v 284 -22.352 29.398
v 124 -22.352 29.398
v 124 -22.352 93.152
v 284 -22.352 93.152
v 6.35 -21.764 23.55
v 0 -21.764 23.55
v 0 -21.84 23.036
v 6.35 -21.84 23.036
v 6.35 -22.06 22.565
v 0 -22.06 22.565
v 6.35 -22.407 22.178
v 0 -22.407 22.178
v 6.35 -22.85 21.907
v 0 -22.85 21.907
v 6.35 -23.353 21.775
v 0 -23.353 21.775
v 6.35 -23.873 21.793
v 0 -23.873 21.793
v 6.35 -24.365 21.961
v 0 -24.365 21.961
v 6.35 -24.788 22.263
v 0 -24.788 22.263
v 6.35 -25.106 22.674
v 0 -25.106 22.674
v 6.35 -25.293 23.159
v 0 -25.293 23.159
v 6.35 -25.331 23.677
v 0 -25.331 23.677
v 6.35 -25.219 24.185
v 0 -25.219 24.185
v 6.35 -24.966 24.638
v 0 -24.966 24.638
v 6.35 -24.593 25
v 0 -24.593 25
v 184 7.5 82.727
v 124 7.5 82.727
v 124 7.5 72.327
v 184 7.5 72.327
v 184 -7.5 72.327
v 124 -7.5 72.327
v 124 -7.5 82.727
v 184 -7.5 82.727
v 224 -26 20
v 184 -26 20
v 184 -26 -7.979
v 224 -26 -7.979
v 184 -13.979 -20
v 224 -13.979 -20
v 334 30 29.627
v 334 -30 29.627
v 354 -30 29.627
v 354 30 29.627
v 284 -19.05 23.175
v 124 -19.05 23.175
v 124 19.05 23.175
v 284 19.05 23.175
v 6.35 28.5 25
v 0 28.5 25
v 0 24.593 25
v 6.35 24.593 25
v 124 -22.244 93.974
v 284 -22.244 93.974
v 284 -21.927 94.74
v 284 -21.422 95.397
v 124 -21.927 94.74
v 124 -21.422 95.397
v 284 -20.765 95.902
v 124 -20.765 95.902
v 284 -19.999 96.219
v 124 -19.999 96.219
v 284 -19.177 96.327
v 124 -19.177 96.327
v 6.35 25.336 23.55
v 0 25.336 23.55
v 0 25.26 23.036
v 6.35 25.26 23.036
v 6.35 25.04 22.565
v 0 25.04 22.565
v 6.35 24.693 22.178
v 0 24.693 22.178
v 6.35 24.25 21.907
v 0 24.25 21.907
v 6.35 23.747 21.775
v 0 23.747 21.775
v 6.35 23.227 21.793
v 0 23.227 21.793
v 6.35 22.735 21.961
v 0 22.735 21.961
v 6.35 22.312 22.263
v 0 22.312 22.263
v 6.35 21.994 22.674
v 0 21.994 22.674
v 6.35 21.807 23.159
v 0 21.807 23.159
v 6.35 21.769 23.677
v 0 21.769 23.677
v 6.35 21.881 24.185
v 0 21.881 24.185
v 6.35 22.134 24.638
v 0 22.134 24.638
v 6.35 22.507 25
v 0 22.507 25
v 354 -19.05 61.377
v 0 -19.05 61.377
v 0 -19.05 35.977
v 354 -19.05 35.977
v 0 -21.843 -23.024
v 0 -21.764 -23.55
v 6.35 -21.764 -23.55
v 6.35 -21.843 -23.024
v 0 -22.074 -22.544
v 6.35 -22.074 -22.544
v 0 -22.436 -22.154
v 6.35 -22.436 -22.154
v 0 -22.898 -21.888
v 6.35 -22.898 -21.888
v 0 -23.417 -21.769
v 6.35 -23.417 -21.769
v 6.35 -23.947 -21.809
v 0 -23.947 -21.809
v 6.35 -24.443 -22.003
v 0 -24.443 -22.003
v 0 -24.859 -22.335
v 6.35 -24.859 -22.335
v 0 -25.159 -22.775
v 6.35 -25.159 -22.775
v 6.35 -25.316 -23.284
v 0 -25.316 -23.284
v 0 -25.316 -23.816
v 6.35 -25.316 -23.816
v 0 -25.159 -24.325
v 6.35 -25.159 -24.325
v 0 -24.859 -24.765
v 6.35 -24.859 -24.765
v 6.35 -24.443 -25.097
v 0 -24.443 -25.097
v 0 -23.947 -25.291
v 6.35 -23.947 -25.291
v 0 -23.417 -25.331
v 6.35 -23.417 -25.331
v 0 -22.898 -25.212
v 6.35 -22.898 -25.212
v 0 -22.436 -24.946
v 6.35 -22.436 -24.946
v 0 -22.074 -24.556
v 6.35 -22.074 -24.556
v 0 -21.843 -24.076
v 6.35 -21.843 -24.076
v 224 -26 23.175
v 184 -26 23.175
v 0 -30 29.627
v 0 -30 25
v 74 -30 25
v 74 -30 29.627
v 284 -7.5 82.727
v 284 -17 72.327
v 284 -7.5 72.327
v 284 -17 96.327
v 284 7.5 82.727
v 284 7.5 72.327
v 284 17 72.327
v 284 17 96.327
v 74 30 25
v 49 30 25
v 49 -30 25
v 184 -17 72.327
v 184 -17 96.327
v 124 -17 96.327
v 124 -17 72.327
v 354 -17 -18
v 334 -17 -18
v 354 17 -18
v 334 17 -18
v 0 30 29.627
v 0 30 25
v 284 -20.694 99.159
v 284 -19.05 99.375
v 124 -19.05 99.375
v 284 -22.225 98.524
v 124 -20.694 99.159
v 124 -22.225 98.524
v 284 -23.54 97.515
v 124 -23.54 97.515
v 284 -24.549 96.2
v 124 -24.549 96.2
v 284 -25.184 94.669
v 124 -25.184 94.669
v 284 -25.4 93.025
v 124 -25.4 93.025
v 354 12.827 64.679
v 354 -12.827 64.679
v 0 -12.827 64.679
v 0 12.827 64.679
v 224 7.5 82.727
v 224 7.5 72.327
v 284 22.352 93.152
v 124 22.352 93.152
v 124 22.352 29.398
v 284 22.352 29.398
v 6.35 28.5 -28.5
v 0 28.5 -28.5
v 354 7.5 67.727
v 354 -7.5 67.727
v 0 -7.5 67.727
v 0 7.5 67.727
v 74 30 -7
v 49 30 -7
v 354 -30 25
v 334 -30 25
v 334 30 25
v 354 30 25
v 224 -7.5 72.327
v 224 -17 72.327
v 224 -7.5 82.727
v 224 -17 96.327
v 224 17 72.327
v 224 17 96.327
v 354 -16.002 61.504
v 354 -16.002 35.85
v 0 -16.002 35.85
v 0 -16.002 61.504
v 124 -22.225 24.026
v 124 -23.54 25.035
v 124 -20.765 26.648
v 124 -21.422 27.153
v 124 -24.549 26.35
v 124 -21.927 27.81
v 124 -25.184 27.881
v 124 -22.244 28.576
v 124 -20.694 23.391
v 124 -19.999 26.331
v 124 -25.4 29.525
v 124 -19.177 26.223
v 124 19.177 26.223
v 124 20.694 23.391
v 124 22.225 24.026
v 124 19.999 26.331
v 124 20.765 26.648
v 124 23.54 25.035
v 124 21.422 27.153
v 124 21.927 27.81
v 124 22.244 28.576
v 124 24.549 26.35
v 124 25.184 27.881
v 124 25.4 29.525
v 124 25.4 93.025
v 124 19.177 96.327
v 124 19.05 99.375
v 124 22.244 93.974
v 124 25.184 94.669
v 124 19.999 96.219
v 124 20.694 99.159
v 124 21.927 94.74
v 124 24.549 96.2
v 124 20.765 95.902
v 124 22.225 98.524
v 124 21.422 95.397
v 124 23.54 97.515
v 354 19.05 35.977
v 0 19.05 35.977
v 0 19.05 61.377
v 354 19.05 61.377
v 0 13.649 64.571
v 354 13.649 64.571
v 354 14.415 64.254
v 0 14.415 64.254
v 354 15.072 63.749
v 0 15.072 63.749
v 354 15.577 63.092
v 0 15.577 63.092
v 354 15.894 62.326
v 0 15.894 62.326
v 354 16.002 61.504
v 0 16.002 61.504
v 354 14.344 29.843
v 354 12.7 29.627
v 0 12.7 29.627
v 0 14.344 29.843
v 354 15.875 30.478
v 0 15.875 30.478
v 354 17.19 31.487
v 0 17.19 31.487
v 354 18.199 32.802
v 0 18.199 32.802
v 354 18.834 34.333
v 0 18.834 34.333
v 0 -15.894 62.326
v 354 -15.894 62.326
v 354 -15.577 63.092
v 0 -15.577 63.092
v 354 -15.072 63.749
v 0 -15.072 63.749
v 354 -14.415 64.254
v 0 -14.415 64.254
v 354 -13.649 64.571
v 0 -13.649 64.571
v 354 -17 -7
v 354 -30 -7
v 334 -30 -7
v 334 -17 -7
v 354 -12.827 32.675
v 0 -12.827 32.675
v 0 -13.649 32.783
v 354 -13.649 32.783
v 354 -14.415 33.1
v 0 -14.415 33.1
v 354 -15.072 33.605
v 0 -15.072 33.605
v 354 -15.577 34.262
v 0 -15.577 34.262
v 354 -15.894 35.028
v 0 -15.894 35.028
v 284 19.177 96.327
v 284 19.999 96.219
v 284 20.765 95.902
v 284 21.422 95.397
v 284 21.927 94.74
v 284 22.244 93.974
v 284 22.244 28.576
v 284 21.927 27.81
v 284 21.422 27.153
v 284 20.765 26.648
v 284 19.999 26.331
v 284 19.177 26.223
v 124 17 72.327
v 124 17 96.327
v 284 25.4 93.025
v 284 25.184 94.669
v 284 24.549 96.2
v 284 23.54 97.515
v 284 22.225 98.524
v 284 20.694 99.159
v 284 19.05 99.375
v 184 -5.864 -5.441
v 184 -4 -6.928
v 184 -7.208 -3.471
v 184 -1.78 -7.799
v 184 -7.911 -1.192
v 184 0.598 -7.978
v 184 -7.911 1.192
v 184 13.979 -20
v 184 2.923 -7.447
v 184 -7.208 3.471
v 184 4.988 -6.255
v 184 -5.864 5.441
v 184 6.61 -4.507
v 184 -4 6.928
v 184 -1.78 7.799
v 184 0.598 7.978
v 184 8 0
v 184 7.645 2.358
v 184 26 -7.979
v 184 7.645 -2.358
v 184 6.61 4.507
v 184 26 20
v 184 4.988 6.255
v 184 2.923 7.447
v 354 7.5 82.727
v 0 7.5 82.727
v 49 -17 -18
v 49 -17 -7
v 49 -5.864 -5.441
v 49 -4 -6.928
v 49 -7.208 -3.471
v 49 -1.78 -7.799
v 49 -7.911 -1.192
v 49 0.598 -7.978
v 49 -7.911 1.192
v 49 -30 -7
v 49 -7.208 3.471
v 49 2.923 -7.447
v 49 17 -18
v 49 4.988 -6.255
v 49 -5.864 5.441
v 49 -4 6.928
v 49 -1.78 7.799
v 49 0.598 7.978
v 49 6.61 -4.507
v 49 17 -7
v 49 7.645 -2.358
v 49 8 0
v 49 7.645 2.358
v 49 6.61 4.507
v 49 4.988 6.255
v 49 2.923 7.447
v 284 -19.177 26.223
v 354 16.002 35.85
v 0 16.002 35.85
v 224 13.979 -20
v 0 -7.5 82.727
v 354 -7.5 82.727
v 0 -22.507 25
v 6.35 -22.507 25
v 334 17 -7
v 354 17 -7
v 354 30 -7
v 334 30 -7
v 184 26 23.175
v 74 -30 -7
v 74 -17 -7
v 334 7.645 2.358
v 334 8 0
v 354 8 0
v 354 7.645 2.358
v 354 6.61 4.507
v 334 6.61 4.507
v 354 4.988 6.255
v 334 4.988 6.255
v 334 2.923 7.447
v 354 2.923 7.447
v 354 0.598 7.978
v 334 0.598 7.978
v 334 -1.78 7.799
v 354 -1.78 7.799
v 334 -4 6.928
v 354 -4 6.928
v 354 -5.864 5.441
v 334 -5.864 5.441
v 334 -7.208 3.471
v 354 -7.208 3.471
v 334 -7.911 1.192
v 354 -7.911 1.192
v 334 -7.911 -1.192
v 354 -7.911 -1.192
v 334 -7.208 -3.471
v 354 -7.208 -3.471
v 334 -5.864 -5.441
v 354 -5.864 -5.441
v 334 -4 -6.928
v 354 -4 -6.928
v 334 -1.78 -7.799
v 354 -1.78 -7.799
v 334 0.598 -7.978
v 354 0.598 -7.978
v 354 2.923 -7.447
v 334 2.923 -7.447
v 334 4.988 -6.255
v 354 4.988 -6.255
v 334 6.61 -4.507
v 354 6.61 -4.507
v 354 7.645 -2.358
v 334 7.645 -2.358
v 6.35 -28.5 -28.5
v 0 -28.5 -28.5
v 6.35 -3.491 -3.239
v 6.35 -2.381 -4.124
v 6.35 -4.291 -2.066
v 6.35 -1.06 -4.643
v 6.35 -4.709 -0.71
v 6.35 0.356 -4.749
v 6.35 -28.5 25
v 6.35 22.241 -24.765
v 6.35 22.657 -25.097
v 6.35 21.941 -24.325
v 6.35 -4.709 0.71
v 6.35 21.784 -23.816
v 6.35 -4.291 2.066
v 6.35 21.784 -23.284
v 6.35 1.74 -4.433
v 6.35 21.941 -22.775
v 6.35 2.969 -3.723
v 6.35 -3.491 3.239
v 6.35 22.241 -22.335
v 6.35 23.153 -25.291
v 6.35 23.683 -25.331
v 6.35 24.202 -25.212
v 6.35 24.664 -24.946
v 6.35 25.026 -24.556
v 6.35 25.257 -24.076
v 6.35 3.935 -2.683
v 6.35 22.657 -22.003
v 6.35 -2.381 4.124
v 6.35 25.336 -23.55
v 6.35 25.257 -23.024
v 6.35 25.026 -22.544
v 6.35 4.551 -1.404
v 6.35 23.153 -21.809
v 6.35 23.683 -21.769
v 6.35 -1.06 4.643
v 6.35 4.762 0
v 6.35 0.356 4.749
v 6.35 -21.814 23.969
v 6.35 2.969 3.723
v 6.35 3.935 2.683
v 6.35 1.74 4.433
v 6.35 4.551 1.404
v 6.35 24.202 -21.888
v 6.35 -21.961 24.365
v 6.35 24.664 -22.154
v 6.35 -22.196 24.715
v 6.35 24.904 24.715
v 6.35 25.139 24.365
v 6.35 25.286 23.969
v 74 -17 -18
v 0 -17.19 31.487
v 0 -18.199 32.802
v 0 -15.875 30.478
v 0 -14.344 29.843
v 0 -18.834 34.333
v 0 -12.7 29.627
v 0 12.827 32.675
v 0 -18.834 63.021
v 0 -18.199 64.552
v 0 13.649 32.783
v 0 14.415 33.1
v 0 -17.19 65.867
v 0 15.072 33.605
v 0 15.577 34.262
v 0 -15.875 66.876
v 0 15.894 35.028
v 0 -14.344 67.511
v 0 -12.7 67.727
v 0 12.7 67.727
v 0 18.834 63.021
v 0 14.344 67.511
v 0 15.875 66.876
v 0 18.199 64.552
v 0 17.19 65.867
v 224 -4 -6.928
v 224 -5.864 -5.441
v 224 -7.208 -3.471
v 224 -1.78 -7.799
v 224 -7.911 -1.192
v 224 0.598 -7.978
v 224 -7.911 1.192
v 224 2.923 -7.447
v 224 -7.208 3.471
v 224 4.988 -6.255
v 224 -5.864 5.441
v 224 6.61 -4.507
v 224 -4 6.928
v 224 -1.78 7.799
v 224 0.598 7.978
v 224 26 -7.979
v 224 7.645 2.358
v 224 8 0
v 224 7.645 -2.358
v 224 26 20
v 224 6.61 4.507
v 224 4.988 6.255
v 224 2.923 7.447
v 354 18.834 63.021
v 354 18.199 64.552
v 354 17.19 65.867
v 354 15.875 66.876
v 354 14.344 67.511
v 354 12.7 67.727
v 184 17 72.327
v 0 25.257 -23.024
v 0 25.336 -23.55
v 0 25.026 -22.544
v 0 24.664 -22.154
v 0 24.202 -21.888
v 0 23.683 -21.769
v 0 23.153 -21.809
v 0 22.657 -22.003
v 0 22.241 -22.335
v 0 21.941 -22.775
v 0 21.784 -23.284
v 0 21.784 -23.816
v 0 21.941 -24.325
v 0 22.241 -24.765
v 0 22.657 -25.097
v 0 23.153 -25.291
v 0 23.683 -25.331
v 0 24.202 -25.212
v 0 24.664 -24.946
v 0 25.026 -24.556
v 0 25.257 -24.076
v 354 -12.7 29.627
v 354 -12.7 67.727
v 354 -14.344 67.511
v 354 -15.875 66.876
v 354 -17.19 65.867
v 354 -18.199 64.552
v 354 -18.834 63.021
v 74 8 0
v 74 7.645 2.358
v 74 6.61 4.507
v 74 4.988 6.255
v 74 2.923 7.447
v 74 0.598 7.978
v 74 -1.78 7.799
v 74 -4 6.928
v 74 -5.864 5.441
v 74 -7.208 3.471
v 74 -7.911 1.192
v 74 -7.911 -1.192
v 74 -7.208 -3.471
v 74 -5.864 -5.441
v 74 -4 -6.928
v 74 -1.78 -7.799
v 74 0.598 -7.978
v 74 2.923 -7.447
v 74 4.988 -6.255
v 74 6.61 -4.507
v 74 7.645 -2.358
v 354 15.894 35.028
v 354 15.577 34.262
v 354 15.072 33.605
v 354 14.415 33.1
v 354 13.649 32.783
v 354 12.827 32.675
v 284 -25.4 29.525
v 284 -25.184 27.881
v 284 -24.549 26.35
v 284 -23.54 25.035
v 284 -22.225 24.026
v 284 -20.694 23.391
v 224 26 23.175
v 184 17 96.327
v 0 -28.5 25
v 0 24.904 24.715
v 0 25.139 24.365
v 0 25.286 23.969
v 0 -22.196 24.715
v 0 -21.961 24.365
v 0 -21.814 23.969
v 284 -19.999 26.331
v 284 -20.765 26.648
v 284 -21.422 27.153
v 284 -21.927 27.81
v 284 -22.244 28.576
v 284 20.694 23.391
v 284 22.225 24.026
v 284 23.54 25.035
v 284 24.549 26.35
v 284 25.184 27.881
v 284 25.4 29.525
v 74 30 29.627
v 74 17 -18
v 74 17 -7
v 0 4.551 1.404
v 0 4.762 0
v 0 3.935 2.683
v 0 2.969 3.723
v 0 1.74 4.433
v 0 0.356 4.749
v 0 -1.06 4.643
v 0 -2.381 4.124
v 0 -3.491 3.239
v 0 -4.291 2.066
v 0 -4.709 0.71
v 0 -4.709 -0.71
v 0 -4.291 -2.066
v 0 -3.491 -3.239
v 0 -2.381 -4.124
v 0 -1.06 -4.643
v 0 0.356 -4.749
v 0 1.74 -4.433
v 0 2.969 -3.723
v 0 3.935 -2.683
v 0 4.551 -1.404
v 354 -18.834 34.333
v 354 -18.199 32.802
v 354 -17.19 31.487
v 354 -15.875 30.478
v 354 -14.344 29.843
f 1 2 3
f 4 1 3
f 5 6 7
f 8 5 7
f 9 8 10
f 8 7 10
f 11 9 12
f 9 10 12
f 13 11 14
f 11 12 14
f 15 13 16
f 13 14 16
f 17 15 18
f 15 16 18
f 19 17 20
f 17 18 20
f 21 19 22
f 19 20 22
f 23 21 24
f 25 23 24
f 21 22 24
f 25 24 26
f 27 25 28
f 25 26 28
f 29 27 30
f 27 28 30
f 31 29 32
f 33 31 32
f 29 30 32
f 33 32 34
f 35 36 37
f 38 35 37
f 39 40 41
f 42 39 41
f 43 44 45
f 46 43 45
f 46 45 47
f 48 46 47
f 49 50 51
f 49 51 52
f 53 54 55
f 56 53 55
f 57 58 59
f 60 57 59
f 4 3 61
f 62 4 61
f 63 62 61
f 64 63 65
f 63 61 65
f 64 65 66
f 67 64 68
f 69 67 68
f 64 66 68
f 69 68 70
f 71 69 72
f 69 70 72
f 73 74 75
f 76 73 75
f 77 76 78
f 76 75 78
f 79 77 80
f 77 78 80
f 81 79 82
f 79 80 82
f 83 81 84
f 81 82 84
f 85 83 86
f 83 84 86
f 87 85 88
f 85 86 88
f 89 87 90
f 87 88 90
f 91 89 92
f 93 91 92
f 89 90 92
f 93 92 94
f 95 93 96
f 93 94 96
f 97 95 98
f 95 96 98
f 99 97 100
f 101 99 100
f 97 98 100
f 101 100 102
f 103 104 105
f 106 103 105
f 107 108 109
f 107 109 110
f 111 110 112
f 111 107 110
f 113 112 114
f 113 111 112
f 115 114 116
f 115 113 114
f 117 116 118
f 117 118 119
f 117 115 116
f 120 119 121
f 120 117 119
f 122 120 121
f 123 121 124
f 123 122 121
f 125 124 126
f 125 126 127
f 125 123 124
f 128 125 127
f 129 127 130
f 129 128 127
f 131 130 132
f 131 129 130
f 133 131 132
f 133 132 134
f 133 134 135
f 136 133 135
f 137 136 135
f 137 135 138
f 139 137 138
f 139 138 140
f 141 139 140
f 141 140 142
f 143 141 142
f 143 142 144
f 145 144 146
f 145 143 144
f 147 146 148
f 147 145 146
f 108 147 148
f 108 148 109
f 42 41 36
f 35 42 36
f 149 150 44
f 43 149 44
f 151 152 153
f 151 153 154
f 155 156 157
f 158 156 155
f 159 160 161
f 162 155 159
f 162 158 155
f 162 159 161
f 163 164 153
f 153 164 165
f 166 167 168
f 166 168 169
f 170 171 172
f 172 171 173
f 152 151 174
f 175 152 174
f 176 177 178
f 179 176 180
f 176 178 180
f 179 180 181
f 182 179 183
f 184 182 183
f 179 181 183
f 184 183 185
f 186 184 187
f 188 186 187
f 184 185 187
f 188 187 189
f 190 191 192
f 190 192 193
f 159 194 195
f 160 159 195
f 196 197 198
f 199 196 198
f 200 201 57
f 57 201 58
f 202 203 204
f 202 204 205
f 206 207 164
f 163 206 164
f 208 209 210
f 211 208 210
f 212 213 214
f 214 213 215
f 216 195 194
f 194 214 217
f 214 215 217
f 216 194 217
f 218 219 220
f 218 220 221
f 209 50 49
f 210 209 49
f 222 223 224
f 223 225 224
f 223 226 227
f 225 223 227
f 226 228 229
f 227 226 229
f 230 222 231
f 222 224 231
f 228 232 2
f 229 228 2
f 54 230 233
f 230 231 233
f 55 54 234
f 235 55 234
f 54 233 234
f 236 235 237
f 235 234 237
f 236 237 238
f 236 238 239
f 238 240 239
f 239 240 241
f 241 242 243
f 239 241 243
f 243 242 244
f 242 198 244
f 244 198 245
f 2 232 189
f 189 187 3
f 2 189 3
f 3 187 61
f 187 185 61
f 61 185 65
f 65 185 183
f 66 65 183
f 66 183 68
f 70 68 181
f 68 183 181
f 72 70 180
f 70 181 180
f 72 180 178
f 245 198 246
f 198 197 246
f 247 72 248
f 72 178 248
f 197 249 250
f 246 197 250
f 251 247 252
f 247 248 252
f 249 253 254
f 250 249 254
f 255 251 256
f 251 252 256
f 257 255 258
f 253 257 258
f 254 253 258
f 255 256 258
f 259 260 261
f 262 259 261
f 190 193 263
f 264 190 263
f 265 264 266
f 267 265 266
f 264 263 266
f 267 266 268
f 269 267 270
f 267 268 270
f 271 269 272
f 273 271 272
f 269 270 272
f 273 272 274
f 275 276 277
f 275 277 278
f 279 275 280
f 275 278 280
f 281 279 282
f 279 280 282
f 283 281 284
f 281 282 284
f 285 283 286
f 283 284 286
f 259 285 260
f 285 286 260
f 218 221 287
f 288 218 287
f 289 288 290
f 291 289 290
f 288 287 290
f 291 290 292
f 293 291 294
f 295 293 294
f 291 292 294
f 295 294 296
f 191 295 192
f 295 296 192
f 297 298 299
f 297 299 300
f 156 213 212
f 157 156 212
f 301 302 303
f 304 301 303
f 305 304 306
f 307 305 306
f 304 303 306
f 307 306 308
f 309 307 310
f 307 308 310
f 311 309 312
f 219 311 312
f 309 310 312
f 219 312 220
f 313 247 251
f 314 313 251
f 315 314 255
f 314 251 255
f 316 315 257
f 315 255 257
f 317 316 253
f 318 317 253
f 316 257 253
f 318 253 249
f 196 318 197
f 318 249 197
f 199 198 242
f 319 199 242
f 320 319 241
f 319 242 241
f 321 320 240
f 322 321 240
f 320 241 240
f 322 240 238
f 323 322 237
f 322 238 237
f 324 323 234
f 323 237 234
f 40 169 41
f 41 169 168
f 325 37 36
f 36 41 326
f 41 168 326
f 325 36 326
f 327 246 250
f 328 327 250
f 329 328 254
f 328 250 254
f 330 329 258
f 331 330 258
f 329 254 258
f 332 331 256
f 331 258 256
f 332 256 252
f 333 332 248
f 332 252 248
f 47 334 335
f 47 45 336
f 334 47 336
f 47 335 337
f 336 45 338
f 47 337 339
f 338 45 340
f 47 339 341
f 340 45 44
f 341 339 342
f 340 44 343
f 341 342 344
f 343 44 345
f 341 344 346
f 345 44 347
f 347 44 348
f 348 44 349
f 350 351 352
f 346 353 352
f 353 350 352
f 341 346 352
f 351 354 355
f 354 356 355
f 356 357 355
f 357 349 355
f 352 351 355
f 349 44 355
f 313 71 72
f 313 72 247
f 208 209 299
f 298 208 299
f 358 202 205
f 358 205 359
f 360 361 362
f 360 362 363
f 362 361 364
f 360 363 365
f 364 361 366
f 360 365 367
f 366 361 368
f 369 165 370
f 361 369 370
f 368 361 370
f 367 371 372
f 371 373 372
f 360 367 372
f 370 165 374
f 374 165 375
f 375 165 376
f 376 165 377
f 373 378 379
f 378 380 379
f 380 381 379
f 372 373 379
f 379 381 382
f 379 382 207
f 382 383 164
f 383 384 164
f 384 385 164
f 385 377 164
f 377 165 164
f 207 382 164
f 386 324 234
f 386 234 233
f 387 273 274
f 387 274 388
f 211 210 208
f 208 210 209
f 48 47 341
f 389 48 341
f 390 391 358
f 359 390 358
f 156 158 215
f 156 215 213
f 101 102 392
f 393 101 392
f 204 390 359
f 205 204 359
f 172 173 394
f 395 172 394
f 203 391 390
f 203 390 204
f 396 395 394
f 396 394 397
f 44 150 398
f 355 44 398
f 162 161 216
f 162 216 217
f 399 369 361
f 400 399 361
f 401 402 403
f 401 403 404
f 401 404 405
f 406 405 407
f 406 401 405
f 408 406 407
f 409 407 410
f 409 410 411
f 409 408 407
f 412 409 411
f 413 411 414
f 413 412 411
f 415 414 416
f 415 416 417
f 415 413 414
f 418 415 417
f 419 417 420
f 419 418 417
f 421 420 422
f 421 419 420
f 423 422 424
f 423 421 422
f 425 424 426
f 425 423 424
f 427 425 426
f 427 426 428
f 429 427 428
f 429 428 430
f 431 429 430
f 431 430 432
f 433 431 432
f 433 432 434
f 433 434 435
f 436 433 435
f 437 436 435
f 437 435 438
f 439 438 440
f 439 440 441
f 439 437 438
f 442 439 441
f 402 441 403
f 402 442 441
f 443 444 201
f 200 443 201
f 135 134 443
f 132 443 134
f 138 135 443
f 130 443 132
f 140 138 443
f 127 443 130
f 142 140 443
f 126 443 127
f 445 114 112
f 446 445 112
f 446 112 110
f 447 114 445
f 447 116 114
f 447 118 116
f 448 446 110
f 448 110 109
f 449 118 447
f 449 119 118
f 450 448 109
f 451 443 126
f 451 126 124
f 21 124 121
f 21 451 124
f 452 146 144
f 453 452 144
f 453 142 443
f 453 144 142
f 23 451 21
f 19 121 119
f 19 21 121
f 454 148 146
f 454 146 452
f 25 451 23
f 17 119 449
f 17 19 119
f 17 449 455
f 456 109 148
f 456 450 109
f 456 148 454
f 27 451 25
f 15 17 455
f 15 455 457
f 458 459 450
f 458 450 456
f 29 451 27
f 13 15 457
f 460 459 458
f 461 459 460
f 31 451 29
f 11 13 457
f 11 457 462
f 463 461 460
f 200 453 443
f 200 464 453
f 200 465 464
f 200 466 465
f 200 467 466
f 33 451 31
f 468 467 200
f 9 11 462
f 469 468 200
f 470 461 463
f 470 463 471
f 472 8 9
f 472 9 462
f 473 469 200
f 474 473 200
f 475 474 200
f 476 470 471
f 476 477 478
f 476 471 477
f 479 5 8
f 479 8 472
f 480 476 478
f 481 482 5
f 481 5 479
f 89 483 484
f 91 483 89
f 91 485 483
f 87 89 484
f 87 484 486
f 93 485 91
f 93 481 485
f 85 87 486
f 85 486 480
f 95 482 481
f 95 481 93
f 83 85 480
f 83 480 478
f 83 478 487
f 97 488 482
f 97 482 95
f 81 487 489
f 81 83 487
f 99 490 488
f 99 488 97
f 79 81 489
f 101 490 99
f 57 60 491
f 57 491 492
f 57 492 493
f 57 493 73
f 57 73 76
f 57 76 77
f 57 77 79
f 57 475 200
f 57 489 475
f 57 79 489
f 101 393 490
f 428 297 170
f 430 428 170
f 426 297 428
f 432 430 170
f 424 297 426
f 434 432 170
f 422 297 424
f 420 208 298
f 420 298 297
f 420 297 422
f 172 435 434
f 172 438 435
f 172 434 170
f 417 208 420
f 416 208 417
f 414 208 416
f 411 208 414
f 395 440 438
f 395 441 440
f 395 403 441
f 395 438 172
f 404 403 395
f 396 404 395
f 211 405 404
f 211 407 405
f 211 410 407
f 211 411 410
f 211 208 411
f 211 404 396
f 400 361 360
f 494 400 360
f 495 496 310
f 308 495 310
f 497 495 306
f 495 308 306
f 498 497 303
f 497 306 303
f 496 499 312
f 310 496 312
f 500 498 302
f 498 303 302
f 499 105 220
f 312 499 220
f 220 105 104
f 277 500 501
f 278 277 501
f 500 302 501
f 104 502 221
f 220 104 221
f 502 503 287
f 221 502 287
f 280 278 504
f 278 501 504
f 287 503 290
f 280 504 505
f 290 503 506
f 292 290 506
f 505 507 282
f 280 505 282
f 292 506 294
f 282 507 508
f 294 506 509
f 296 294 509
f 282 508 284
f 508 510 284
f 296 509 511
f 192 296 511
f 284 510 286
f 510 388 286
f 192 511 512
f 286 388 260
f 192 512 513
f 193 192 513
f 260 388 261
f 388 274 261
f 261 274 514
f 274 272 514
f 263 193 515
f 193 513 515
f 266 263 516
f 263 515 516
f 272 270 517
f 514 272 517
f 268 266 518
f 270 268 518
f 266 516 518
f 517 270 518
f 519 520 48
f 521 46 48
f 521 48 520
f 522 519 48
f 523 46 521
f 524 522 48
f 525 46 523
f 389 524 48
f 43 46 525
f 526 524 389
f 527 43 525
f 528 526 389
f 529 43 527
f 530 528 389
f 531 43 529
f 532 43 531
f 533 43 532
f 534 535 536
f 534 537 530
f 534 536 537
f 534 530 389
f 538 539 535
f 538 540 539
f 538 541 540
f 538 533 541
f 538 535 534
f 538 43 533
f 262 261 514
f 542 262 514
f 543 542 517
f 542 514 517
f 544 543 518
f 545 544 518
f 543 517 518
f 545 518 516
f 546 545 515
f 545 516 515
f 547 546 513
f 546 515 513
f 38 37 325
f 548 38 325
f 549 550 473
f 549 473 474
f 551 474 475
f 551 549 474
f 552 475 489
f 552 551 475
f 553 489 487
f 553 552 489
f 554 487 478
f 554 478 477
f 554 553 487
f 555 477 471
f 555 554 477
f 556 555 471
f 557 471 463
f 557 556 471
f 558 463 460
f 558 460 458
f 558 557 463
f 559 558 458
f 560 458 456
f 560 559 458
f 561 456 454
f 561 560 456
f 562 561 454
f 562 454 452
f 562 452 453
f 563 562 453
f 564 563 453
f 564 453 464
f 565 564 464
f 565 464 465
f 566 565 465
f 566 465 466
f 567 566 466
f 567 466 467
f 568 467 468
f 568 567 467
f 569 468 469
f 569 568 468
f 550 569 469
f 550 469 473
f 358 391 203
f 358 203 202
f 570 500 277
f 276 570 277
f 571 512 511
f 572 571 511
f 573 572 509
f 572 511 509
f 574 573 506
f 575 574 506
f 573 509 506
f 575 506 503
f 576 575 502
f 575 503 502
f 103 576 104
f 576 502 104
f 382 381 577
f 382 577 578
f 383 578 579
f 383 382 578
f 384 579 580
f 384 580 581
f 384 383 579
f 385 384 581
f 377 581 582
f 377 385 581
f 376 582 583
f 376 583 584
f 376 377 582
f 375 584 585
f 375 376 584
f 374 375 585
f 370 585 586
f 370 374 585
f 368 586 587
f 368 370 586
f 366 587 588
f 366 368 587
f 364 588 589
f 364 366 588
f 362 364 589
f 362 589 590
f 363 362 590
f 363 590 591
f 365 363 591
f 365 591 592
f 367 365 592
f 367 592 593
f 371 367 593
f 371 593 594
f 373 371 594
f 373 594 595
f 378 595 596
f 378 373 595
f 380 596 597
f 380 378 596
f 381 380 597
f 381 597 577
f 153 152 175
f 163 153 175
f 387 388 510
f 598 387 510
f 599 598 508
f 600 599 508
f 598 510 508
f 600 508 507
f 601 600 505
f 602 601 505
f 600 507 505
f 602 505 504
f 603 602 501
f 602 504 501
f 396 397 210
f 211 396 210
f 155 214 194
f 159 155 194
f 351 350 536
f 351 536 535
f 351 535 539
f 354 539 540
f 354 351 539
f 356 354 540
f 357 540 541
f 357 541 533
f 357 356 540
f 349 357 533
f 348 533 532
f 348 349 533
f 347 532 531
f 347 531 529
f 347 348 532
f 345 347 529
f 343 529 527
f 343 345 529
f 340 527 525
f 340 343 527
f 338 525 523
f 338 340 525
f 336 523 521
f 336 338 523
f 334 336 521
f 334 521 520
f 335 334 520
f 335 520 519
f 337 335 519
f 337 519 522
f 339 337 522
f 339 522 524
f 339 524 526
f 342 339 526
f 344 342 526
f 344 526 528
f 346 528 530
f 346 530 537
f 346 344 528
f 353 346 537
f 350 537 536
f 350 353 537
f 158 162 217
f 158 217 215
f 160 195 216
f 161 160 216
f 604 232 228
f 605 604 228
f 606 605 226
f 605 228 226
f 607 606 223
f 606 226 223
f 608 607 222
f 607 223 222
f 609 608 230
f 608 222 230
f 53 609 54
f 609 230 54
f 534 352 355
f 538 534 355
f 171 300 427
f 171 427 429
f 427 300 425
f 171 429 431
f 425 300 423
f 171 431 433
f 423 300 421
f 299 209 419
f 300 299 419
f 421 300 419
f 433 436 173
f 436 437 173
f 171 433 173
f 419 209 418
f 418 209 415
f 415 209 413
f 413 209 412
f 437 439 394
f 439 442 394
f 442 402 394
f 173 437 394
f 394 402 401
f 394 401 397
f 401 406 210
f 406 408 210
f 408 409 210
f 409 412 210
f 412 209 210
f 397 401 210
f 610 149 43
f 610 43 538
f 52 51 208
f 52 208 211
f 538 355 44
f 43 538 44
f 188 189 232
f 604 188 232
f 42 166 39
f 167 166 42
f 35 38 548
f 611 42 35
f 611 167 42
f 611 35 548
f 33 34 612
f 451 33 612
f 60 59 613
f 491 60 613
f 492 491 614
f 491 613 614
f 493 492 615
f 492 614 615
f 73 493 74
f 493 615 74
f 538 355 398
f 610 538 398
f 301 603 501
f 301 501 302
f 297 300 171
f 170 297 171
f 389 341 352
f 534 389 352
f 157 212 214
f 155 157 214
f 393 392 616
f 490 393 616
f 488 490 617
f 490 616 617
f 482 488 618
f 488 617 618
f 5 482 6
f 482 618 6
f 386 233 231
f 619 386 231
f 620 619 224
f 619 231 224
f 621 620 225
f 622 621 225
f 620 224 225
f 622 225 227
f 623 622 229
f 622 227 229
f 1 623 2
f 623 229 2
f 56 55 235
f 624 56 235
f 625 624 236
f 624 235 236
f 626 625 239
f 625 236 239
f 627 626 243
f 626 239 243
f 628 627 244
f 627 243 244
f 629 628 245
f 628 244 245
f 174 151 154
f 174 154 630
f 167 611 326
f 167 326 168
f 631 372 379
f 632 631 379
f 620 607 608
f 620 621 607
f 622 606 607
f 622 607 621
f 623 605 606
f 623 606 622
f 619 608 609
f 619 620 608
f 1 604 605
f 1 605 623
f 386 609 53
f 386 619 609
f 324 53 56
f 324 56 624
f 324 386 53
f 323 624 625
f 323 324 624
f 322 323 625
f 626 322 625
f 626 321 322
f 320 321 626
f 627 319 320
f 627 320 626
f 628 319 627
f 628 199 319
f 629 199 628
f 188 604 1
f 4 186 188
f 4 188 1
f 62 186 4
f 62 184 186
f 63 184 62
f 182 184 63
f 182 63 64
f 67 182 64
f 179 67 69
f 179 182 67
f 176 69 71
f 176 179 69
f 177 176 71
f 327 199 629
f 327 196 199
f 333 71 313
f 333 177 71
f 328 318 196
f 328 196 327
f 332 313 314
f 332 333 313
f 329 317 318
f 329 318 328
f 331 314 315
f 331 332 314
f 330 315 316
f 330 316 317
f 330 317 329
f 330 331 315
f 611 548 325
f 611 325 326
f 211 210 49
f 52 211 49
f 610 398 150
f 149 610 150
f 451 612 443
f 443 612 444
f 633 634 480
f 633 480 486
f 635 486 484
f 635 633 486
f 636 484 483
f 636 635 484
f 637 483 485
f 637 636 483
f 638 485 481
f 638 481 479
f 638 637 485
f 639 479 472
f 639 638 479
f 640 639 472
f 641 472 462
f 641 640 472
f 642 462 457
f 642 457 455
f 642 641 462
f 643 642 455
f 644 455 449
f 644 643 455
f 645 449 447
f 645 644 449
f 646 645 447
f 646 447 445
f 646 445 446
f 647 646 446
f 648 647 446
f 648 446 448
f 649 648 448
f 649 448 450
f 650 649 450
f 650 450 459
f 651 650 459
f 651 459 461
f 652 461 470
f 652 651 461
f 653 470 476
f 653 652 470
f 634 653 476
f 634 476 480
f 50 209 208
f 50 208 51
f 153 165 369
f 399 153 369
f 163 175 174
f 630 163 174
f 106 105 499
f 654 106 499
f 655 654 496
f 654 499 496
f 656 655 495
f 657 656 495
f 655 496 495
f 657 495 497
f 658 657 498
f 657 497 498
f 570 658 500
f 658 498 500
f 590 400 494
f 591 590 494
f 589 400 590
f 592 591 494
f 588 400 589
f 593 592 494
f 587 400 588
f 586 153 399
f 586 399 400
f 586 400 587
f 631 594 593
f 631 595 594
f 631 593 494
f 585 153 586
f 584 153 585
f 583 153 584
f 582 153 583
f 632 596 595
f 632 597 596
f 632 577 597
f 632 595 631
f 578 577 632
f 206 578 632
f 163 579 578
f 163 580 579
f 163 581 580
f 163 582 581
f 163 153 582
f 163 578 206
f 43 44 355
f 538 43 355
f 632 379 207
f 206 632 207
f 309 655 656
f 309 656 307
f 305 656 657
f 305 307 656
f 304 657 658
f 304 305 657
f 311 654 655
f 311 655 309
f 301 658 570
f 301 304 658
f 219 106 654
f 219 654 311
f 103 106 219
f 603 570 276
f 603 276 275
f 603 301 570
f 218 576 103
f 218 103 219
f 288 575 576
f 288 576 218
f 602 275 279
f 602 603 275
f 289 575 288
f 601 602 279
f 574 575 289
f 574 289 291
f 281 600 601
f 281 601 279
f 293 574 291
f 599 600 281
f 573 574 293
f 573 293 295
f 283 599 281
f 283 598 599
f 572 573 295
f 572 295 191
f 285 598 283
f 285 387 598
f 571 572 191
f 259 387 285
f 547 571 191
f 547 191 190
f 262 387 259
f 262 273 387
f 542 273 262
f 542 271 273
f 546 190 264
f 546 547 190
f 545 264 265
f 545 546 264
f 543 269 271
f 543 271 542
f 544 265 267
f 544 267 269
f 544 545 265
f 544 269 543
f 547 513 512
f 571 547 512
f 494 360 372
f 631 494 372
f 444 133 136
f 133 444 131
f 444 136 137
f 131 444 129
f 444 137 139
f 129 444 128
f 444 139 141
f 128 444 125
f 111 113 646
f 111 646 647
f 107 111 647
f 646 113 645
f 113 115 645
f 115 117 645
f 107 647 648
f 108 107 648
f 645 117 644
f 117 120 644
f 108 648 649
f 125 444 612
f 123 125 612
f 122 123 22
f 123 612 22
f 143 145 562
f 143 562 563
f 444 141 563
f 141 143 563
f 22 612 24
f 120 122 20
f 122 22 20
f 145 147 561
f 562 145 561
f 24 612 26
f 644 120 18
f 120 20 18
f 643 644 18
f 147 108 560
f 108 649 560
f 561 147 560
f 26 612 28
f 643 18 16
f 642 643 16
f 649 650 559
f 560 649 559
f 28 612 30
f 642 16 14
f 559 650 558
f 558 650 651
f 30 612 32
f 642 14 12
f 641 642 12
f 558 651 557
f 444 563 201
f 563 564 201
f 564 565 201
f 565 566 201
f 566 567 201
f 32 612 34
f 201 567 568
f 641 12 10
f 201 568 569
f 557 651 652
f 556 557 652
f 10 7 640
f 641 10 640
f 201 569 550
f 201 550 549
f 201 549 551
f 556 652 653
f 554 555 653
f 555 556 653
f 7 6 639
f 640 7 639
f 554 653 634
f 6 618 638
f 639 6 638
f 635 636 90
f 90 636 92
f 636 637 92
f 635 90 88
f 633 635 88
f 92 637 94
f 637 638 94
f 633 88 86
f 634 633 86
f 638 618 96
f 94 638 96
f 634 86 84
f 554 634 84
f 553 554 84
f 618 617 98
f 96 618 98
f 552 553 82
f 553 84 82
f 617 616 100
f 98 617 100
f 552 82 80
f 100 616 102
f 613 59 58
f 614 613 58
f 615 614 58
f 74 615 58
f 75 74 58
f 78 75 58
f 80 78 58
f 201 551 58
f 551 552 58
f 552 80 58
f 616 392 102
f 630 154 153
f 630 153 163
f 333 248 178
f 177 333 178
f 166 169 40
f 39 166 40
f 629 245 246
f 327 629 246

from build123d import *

# Parameters (mm, degrees)
F5_R      = 1.7859375
F5_R_2    = 4.7625
F7_DEPTH  = 6.35
F8_START  = 49
F4_R      = 8
F8_DEPTH  = 25
F9_START  = 124
F9_DEPTH  = 160
F10_DEPTH = 354
F11_START = 184
F0_R      = 8
F11_DEPTH = 40
F4_W      = 60
F4_H      = 4.6269972401
F12_DEPTH = 74
F13_START = 334
F13_DEPTH = 20
F14_START = 334
F14_DEPTH = 20
F15_START = 184
F15_DEPTH = 40
F2_W      = 15
F2_H      = 10.4
F2_H_2    = 4.6
F16_DEPTH = 354
F17_START = 124
F17_DEPTH = 60
F18_START = 224
F18_DEPTH = 60


# Not quite as in the source:
# - ends of sketch curves that miss each other by under 0.0002 mm in the source are joined


with BuildPart() as f7:
    # F5 (on Right) → F7 (new body, through all)
    with BuildSketch(Plane.YZ):
        with BuildLine():
            ThreePointArc((-22.5073760265, 25.0000027599), (-21.9607180856, 24.3647120661), (-21.7640625, 23.55))
            ThreePointArc((-21.7640625, 23.55), (-24.3647120661, 21.9607180856), (-24.5926239735, 25.0000027599))
            Line((-24.5926239735, 25.0000027599), (-28.5, 25.0000027599))
            Line((-28.5, 25.0000027599), (-28.5, -28.5))
            Line((-28.5, -28.5), (28.5, -28.5))
            Line((28.5, -28.5), (28.5, 25.0000027599))
            Line((28.5, 25.0000027599), (24.5926239735, 25.0000027599))
            ThreePointArc((24.5926239735, 25.0000027599), (25.1392819144, 24.3647120661), (25.3359375, 23.55))
            ThreePointArc((25.3359375, 23.55), (22.7352879339, 21.9607180856), (22.5073760265, 25.0000027599))
            Line((22.5073760265, 25.0000027599), (-22.5073760265, 25.0000027599))
        make_face()
        with Locations((-23.55, -23.55)):
            Circle(F5_R, mode=Mode.SUBTRACT)
        with Locations((23.55, -23.55)):
            Circle(F5_R, mode=Mode.SUBTRACT)
        Circle(F5_R_2, mode=Mode.SUBTRACT)
    extrude(amount=F7_DEPTH)


with BuildPart() as f8:
    # F4 (on Right) → F8 (new body)
    with BuildSketch(Plane.YZ.offset(F8_START)):
        Polygon((30, 25.0000027599), (-30, 24.9999972401), (-30, -7.0000027599), (-17, -7.0000027599), (-17, -18.0000027599), (17, -18.0000027599), (17, -7.0000027599), (30, -7.0000027599), align=None)
        Circle(F4_R, mode=Mode.SUBTRACT)
    extrude(amount=F8_DEPTH)


with BuildPart() as f9:
    # F1 (on Right) → F9 (new body)
    with BuildSketch(Plane.YZ.offset(F9_START)):
        with BuildLine():
            ThreePointArc((25.4, 93.025), (23.5401280605, 97.5151280605), (19.05, 99.375))
            Line((19.05, 99.375), (-19.05, 99.375))
            ThreePointArc((-19.05, 99.375), (-23.5401280605, 97.5151280605), (-25.4, 93.025))
            Line((-25.4, 93.025), (-25.4, 29.525))
            ThreePointArc((-25.4, 29.525), (-23.5401280605, 25.0348719395), (-19.05, 23.175))
            Line((-19.05, 23.175), (19.05, 23.175))
            ThreePointArc((19.05, 23.175), (23.5401280605, 25.0348719395), (25.4, 29.525))
            Line((25.4, 29.525), (25.4, 93.025))
        make_face()
        with BuildLine():
            Line((-19.177, 96.327), (19.177, 96.327))
            ThreePointArc((19.177, 96.327), (21.4220640303, 95.3970640303), (22.352, 93.152))
            Line((22.352, 93.152), (22.352, 29.398))
            ThreePointArc((22.352, 29.398), (21.4220640303, 27.1529359697), (19.177, 26.223))
            Line((19.177, 26.223), (-19.177, 26.223))
            ThreePointArc((-19.177, 26.223), (-21.4220640303, 27.1529359697), (-22.352, 29.398))
            Line((-22.352, 29.398), (-22.352, 93.152))
            ThreePointArc((-22.352, 93.152), (-21.4220640303, 95.3970640303), (-19.177, 96.327))
        make_face(mode=Mode.SUBTRACT)
    extrude(amount=F9_DEPTH)


with BuildPart() as f10:
    # F3 (on Right) → F10 (new body, through all)
    with BuildSketch(Plane.YZ):
        with BuildLine():
            ThreePointArc((19.05, 61.377), (17.1901280605, 65.8671280605), (12.7, 67.727))
            Line((12.7, 67.727), (-12.7, 67.727))
            ThreePointArc((-12.7, 67.727), (-17.1901280605, 65.8671280605), (-19.05, 61.377))
            Line((-19.05, 61.377), (-19.05, 35.977))
            ThreePointArc((-19.05, 35.977), (-17.1901280605, 31.4868719395), (-12.7, 29.627))
            Line((-12.7, 29.627), (12.7, 29.627))
            ThreePointArc((12.7, 29.627), (17.1901280605, 31.4868719395), (19.05, 35.977))
            Line((19.05, 35.977), (19.05, 61.377))
        make_face()
        with BuildLine():
            Line((-12.827, 64.679), (12.827, 64.679))
            ThreePointArc((12.827, 64.679), (15.0720640303, 63.7490640303), (16.002, 61.504))
            Line((16.002, 61.504), (16.002, 35.85))
            ThreePointArc((16.002, 35.85), (15.0720640303, 33.6049359697), (12.827, 32.675))
            Line((12.827, 32.675), (-12.827, 32.675))
            ThreePointArc((-12.827, 32.675), (-15.0720640303, 33.6049359697), (-16.002, 35.85))
            Line((-16.002, 35.85), (-16.002, 61.504))
            ThreePointArc((-16.002, 61.504), (-15.0720640303, 63.7490640303), (-12.827, 64.679))
        make_face(mode=Mode.SUBTRACT)
    extrude(amount=F10_DEPTH)


with BuildPart() as f11:
    # F0 (on Right) → F11 (new body)
    with BuildSketch(Plane.YZ.offset(F11_START)):
        Polygon((26, 20), (-26, 20), (-26, -7.9791847198), (-13.9791847198, -20), (13.9791847198, -20), (26, -7.9791847198), align=None)
        Circle(F0_R, mode=Mode.SUBTRACT)
    extrude(amount=F11_DEPTH)


with BuildPart() as f12:
    # F4 (on Right) → F12 (new body, through all)
    with BuildSketch(Plane.YZ):
        with Locations((0, 27.31350138)):
            Rectangle(F4_W, F4_H)
    extrude(amount=F12_DEPTH)


with BuildPart() as f13:
    # F4 (on Right) → F13 (new body)
    with BuildSketch(Plane.YZ.offset(F13_START)):
        Polygon((30, 25.0000027599), (-30, 24.9999972401), (-30, -7.0000027599), (-17, -7.0000027599), (-17, -18.0000027599), (17, -18.0000027599), (17, -7.0000027599), (30, -7.0000027599), align=None)
        Circle(F4_R, mode=Mode.SUBTRACT)
    extrude(amount=F13_DEPTH)


with BuildPart() as f14:
    # F4 (on Right) → F14 (new body)
    with BuildSketch(Plane.YZ.offset(F14_START)):
        with Locations((0, 27.31350138)):
            Rectangle(F4_W, F4_H)
    extrude(amount=F14_DEPTH)


with BuildPart() as f15:
    # F1 (on Right) → F15 (new body)
    with BuildSketch(Plane.YZ.offset(F15_START)):
        Polygon((26, 23.175), (19.05, 23.175), (-19.05, 23.175), (-26, 23.175), (-26, 20), (26, 20), align=None)
    extrude(amount=F15_DEPTH)


with BuildPart() as f16:
    # F2 (on Right) → F16 (new body, through all)
    with BuildSketch(Plane.YZ):
        with Locations((0, 77.527)):
            Rectangle(F2_W, F2_H)
        with Locations((0, 70.027)):
            Rectangle(F2_W, F2_H_2)
    extrude(amount=F16_DEPTH)


with BuildPart() as f17:
    # F2 (on Right) → F17 (new body)
    with BuildSketch(Plane.YZ.offset(F17_START)):
        Polygon((7.5, 82.727), (7.5, 72.327), (17, 72.327), (17, 96.327), (-17, 96.327), (-17, 72.327), (-7.5, 72.327), (-7.5, 82.727), align=None)
    extrude(amount=F17_DEPTH)


with BuildPart() as f18:
    # F2 (on Right) → F18 (new body)
    with BuildSketch(Plane.YZ.offset(F18_START)):
        Polygon((7.5, 82.727), (7.5, 72.327), (17, 72.327), (17, 96.327), (-17, 96.327), (-17, 72.327), (-7.5, 72.327), (-7.5, 82.727), align=None)
    extrude(amount=F18_DEPTH)


solid = Compound([f7.part, f8.part, f9.part, f10.part, f11.part, f12.part, f13.part, f14.part, f15.part, f16.part, f17.part, f18.part])
